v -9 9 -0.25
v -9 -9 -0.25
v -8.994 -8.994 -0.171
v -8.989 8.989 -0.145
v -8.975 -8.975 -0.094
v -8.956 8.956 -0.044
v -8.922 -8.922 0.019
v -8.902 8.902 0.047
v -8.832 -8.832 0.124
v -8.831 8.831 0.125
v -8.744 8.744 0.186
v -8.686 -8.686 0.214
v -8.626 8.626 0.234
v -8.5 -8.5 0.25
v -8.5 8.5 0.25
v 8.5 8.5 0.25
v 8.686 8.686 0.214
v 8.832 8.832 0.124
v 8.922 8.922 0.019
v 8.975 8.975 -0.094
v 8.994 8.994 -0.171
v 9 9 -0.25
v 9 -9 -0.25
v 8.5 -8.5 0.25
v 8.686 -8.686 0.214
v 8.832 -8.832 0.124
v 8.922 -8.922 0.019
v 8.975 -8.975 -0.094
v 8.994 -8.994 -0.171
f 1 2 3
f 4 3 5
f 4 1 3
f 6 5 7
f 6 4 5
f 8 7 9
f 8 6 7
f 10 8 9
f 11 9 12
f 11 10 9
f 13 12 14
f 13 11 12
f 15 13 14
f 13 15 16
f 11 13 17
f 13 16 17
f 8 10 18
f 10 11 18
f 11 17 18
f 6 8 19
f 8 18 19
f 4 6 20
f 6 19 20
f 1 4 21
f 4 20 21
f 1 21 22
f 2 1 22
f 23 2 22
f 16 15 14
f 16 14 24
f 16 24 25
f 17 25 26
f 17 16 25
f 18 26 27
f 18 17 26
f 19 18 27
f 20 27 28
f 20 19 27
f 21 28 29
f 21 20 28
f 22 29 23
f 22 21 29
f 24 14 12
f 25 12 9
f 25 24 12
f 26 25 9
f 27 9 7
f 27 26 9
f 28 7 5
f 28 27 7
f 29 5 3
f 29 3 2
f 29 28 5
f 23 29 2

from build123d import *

# Parameters (mm, degrees)
IZIM1_W                     = 18
IZIM1_H                     = 18
Y_KSEKLIK_EKSTR_ZYON1_DEPTH = 0.25
RADYUS1_R                   = 0.5


with BuildPart() as part:
    # Çizim1 → Yükseklik-Ekstrüzyon1 (new, symmetric)
    with BuildSketch(Plane.XY):
        Rectangle(IZIM1_W, IZIM1_H)
    extrude(amount=Y_KSEKLIK_EKSTR_ZYON1_DEPTH, both=True)

    # Radyus1
    radyus1_edges = [part.edges().sort_by_distance(p)[0] for p in [
        (9, 0, 0.25),
        (0, -9, 0.25),
        (-9, 0, 0.25),
        (0, 9, 0.25),
    ]]
    fillet(radyus1_edges, radius=RADYUS1_R - 0.0001)  # a hair under: the kernel refuses the full size


solid = part.part
